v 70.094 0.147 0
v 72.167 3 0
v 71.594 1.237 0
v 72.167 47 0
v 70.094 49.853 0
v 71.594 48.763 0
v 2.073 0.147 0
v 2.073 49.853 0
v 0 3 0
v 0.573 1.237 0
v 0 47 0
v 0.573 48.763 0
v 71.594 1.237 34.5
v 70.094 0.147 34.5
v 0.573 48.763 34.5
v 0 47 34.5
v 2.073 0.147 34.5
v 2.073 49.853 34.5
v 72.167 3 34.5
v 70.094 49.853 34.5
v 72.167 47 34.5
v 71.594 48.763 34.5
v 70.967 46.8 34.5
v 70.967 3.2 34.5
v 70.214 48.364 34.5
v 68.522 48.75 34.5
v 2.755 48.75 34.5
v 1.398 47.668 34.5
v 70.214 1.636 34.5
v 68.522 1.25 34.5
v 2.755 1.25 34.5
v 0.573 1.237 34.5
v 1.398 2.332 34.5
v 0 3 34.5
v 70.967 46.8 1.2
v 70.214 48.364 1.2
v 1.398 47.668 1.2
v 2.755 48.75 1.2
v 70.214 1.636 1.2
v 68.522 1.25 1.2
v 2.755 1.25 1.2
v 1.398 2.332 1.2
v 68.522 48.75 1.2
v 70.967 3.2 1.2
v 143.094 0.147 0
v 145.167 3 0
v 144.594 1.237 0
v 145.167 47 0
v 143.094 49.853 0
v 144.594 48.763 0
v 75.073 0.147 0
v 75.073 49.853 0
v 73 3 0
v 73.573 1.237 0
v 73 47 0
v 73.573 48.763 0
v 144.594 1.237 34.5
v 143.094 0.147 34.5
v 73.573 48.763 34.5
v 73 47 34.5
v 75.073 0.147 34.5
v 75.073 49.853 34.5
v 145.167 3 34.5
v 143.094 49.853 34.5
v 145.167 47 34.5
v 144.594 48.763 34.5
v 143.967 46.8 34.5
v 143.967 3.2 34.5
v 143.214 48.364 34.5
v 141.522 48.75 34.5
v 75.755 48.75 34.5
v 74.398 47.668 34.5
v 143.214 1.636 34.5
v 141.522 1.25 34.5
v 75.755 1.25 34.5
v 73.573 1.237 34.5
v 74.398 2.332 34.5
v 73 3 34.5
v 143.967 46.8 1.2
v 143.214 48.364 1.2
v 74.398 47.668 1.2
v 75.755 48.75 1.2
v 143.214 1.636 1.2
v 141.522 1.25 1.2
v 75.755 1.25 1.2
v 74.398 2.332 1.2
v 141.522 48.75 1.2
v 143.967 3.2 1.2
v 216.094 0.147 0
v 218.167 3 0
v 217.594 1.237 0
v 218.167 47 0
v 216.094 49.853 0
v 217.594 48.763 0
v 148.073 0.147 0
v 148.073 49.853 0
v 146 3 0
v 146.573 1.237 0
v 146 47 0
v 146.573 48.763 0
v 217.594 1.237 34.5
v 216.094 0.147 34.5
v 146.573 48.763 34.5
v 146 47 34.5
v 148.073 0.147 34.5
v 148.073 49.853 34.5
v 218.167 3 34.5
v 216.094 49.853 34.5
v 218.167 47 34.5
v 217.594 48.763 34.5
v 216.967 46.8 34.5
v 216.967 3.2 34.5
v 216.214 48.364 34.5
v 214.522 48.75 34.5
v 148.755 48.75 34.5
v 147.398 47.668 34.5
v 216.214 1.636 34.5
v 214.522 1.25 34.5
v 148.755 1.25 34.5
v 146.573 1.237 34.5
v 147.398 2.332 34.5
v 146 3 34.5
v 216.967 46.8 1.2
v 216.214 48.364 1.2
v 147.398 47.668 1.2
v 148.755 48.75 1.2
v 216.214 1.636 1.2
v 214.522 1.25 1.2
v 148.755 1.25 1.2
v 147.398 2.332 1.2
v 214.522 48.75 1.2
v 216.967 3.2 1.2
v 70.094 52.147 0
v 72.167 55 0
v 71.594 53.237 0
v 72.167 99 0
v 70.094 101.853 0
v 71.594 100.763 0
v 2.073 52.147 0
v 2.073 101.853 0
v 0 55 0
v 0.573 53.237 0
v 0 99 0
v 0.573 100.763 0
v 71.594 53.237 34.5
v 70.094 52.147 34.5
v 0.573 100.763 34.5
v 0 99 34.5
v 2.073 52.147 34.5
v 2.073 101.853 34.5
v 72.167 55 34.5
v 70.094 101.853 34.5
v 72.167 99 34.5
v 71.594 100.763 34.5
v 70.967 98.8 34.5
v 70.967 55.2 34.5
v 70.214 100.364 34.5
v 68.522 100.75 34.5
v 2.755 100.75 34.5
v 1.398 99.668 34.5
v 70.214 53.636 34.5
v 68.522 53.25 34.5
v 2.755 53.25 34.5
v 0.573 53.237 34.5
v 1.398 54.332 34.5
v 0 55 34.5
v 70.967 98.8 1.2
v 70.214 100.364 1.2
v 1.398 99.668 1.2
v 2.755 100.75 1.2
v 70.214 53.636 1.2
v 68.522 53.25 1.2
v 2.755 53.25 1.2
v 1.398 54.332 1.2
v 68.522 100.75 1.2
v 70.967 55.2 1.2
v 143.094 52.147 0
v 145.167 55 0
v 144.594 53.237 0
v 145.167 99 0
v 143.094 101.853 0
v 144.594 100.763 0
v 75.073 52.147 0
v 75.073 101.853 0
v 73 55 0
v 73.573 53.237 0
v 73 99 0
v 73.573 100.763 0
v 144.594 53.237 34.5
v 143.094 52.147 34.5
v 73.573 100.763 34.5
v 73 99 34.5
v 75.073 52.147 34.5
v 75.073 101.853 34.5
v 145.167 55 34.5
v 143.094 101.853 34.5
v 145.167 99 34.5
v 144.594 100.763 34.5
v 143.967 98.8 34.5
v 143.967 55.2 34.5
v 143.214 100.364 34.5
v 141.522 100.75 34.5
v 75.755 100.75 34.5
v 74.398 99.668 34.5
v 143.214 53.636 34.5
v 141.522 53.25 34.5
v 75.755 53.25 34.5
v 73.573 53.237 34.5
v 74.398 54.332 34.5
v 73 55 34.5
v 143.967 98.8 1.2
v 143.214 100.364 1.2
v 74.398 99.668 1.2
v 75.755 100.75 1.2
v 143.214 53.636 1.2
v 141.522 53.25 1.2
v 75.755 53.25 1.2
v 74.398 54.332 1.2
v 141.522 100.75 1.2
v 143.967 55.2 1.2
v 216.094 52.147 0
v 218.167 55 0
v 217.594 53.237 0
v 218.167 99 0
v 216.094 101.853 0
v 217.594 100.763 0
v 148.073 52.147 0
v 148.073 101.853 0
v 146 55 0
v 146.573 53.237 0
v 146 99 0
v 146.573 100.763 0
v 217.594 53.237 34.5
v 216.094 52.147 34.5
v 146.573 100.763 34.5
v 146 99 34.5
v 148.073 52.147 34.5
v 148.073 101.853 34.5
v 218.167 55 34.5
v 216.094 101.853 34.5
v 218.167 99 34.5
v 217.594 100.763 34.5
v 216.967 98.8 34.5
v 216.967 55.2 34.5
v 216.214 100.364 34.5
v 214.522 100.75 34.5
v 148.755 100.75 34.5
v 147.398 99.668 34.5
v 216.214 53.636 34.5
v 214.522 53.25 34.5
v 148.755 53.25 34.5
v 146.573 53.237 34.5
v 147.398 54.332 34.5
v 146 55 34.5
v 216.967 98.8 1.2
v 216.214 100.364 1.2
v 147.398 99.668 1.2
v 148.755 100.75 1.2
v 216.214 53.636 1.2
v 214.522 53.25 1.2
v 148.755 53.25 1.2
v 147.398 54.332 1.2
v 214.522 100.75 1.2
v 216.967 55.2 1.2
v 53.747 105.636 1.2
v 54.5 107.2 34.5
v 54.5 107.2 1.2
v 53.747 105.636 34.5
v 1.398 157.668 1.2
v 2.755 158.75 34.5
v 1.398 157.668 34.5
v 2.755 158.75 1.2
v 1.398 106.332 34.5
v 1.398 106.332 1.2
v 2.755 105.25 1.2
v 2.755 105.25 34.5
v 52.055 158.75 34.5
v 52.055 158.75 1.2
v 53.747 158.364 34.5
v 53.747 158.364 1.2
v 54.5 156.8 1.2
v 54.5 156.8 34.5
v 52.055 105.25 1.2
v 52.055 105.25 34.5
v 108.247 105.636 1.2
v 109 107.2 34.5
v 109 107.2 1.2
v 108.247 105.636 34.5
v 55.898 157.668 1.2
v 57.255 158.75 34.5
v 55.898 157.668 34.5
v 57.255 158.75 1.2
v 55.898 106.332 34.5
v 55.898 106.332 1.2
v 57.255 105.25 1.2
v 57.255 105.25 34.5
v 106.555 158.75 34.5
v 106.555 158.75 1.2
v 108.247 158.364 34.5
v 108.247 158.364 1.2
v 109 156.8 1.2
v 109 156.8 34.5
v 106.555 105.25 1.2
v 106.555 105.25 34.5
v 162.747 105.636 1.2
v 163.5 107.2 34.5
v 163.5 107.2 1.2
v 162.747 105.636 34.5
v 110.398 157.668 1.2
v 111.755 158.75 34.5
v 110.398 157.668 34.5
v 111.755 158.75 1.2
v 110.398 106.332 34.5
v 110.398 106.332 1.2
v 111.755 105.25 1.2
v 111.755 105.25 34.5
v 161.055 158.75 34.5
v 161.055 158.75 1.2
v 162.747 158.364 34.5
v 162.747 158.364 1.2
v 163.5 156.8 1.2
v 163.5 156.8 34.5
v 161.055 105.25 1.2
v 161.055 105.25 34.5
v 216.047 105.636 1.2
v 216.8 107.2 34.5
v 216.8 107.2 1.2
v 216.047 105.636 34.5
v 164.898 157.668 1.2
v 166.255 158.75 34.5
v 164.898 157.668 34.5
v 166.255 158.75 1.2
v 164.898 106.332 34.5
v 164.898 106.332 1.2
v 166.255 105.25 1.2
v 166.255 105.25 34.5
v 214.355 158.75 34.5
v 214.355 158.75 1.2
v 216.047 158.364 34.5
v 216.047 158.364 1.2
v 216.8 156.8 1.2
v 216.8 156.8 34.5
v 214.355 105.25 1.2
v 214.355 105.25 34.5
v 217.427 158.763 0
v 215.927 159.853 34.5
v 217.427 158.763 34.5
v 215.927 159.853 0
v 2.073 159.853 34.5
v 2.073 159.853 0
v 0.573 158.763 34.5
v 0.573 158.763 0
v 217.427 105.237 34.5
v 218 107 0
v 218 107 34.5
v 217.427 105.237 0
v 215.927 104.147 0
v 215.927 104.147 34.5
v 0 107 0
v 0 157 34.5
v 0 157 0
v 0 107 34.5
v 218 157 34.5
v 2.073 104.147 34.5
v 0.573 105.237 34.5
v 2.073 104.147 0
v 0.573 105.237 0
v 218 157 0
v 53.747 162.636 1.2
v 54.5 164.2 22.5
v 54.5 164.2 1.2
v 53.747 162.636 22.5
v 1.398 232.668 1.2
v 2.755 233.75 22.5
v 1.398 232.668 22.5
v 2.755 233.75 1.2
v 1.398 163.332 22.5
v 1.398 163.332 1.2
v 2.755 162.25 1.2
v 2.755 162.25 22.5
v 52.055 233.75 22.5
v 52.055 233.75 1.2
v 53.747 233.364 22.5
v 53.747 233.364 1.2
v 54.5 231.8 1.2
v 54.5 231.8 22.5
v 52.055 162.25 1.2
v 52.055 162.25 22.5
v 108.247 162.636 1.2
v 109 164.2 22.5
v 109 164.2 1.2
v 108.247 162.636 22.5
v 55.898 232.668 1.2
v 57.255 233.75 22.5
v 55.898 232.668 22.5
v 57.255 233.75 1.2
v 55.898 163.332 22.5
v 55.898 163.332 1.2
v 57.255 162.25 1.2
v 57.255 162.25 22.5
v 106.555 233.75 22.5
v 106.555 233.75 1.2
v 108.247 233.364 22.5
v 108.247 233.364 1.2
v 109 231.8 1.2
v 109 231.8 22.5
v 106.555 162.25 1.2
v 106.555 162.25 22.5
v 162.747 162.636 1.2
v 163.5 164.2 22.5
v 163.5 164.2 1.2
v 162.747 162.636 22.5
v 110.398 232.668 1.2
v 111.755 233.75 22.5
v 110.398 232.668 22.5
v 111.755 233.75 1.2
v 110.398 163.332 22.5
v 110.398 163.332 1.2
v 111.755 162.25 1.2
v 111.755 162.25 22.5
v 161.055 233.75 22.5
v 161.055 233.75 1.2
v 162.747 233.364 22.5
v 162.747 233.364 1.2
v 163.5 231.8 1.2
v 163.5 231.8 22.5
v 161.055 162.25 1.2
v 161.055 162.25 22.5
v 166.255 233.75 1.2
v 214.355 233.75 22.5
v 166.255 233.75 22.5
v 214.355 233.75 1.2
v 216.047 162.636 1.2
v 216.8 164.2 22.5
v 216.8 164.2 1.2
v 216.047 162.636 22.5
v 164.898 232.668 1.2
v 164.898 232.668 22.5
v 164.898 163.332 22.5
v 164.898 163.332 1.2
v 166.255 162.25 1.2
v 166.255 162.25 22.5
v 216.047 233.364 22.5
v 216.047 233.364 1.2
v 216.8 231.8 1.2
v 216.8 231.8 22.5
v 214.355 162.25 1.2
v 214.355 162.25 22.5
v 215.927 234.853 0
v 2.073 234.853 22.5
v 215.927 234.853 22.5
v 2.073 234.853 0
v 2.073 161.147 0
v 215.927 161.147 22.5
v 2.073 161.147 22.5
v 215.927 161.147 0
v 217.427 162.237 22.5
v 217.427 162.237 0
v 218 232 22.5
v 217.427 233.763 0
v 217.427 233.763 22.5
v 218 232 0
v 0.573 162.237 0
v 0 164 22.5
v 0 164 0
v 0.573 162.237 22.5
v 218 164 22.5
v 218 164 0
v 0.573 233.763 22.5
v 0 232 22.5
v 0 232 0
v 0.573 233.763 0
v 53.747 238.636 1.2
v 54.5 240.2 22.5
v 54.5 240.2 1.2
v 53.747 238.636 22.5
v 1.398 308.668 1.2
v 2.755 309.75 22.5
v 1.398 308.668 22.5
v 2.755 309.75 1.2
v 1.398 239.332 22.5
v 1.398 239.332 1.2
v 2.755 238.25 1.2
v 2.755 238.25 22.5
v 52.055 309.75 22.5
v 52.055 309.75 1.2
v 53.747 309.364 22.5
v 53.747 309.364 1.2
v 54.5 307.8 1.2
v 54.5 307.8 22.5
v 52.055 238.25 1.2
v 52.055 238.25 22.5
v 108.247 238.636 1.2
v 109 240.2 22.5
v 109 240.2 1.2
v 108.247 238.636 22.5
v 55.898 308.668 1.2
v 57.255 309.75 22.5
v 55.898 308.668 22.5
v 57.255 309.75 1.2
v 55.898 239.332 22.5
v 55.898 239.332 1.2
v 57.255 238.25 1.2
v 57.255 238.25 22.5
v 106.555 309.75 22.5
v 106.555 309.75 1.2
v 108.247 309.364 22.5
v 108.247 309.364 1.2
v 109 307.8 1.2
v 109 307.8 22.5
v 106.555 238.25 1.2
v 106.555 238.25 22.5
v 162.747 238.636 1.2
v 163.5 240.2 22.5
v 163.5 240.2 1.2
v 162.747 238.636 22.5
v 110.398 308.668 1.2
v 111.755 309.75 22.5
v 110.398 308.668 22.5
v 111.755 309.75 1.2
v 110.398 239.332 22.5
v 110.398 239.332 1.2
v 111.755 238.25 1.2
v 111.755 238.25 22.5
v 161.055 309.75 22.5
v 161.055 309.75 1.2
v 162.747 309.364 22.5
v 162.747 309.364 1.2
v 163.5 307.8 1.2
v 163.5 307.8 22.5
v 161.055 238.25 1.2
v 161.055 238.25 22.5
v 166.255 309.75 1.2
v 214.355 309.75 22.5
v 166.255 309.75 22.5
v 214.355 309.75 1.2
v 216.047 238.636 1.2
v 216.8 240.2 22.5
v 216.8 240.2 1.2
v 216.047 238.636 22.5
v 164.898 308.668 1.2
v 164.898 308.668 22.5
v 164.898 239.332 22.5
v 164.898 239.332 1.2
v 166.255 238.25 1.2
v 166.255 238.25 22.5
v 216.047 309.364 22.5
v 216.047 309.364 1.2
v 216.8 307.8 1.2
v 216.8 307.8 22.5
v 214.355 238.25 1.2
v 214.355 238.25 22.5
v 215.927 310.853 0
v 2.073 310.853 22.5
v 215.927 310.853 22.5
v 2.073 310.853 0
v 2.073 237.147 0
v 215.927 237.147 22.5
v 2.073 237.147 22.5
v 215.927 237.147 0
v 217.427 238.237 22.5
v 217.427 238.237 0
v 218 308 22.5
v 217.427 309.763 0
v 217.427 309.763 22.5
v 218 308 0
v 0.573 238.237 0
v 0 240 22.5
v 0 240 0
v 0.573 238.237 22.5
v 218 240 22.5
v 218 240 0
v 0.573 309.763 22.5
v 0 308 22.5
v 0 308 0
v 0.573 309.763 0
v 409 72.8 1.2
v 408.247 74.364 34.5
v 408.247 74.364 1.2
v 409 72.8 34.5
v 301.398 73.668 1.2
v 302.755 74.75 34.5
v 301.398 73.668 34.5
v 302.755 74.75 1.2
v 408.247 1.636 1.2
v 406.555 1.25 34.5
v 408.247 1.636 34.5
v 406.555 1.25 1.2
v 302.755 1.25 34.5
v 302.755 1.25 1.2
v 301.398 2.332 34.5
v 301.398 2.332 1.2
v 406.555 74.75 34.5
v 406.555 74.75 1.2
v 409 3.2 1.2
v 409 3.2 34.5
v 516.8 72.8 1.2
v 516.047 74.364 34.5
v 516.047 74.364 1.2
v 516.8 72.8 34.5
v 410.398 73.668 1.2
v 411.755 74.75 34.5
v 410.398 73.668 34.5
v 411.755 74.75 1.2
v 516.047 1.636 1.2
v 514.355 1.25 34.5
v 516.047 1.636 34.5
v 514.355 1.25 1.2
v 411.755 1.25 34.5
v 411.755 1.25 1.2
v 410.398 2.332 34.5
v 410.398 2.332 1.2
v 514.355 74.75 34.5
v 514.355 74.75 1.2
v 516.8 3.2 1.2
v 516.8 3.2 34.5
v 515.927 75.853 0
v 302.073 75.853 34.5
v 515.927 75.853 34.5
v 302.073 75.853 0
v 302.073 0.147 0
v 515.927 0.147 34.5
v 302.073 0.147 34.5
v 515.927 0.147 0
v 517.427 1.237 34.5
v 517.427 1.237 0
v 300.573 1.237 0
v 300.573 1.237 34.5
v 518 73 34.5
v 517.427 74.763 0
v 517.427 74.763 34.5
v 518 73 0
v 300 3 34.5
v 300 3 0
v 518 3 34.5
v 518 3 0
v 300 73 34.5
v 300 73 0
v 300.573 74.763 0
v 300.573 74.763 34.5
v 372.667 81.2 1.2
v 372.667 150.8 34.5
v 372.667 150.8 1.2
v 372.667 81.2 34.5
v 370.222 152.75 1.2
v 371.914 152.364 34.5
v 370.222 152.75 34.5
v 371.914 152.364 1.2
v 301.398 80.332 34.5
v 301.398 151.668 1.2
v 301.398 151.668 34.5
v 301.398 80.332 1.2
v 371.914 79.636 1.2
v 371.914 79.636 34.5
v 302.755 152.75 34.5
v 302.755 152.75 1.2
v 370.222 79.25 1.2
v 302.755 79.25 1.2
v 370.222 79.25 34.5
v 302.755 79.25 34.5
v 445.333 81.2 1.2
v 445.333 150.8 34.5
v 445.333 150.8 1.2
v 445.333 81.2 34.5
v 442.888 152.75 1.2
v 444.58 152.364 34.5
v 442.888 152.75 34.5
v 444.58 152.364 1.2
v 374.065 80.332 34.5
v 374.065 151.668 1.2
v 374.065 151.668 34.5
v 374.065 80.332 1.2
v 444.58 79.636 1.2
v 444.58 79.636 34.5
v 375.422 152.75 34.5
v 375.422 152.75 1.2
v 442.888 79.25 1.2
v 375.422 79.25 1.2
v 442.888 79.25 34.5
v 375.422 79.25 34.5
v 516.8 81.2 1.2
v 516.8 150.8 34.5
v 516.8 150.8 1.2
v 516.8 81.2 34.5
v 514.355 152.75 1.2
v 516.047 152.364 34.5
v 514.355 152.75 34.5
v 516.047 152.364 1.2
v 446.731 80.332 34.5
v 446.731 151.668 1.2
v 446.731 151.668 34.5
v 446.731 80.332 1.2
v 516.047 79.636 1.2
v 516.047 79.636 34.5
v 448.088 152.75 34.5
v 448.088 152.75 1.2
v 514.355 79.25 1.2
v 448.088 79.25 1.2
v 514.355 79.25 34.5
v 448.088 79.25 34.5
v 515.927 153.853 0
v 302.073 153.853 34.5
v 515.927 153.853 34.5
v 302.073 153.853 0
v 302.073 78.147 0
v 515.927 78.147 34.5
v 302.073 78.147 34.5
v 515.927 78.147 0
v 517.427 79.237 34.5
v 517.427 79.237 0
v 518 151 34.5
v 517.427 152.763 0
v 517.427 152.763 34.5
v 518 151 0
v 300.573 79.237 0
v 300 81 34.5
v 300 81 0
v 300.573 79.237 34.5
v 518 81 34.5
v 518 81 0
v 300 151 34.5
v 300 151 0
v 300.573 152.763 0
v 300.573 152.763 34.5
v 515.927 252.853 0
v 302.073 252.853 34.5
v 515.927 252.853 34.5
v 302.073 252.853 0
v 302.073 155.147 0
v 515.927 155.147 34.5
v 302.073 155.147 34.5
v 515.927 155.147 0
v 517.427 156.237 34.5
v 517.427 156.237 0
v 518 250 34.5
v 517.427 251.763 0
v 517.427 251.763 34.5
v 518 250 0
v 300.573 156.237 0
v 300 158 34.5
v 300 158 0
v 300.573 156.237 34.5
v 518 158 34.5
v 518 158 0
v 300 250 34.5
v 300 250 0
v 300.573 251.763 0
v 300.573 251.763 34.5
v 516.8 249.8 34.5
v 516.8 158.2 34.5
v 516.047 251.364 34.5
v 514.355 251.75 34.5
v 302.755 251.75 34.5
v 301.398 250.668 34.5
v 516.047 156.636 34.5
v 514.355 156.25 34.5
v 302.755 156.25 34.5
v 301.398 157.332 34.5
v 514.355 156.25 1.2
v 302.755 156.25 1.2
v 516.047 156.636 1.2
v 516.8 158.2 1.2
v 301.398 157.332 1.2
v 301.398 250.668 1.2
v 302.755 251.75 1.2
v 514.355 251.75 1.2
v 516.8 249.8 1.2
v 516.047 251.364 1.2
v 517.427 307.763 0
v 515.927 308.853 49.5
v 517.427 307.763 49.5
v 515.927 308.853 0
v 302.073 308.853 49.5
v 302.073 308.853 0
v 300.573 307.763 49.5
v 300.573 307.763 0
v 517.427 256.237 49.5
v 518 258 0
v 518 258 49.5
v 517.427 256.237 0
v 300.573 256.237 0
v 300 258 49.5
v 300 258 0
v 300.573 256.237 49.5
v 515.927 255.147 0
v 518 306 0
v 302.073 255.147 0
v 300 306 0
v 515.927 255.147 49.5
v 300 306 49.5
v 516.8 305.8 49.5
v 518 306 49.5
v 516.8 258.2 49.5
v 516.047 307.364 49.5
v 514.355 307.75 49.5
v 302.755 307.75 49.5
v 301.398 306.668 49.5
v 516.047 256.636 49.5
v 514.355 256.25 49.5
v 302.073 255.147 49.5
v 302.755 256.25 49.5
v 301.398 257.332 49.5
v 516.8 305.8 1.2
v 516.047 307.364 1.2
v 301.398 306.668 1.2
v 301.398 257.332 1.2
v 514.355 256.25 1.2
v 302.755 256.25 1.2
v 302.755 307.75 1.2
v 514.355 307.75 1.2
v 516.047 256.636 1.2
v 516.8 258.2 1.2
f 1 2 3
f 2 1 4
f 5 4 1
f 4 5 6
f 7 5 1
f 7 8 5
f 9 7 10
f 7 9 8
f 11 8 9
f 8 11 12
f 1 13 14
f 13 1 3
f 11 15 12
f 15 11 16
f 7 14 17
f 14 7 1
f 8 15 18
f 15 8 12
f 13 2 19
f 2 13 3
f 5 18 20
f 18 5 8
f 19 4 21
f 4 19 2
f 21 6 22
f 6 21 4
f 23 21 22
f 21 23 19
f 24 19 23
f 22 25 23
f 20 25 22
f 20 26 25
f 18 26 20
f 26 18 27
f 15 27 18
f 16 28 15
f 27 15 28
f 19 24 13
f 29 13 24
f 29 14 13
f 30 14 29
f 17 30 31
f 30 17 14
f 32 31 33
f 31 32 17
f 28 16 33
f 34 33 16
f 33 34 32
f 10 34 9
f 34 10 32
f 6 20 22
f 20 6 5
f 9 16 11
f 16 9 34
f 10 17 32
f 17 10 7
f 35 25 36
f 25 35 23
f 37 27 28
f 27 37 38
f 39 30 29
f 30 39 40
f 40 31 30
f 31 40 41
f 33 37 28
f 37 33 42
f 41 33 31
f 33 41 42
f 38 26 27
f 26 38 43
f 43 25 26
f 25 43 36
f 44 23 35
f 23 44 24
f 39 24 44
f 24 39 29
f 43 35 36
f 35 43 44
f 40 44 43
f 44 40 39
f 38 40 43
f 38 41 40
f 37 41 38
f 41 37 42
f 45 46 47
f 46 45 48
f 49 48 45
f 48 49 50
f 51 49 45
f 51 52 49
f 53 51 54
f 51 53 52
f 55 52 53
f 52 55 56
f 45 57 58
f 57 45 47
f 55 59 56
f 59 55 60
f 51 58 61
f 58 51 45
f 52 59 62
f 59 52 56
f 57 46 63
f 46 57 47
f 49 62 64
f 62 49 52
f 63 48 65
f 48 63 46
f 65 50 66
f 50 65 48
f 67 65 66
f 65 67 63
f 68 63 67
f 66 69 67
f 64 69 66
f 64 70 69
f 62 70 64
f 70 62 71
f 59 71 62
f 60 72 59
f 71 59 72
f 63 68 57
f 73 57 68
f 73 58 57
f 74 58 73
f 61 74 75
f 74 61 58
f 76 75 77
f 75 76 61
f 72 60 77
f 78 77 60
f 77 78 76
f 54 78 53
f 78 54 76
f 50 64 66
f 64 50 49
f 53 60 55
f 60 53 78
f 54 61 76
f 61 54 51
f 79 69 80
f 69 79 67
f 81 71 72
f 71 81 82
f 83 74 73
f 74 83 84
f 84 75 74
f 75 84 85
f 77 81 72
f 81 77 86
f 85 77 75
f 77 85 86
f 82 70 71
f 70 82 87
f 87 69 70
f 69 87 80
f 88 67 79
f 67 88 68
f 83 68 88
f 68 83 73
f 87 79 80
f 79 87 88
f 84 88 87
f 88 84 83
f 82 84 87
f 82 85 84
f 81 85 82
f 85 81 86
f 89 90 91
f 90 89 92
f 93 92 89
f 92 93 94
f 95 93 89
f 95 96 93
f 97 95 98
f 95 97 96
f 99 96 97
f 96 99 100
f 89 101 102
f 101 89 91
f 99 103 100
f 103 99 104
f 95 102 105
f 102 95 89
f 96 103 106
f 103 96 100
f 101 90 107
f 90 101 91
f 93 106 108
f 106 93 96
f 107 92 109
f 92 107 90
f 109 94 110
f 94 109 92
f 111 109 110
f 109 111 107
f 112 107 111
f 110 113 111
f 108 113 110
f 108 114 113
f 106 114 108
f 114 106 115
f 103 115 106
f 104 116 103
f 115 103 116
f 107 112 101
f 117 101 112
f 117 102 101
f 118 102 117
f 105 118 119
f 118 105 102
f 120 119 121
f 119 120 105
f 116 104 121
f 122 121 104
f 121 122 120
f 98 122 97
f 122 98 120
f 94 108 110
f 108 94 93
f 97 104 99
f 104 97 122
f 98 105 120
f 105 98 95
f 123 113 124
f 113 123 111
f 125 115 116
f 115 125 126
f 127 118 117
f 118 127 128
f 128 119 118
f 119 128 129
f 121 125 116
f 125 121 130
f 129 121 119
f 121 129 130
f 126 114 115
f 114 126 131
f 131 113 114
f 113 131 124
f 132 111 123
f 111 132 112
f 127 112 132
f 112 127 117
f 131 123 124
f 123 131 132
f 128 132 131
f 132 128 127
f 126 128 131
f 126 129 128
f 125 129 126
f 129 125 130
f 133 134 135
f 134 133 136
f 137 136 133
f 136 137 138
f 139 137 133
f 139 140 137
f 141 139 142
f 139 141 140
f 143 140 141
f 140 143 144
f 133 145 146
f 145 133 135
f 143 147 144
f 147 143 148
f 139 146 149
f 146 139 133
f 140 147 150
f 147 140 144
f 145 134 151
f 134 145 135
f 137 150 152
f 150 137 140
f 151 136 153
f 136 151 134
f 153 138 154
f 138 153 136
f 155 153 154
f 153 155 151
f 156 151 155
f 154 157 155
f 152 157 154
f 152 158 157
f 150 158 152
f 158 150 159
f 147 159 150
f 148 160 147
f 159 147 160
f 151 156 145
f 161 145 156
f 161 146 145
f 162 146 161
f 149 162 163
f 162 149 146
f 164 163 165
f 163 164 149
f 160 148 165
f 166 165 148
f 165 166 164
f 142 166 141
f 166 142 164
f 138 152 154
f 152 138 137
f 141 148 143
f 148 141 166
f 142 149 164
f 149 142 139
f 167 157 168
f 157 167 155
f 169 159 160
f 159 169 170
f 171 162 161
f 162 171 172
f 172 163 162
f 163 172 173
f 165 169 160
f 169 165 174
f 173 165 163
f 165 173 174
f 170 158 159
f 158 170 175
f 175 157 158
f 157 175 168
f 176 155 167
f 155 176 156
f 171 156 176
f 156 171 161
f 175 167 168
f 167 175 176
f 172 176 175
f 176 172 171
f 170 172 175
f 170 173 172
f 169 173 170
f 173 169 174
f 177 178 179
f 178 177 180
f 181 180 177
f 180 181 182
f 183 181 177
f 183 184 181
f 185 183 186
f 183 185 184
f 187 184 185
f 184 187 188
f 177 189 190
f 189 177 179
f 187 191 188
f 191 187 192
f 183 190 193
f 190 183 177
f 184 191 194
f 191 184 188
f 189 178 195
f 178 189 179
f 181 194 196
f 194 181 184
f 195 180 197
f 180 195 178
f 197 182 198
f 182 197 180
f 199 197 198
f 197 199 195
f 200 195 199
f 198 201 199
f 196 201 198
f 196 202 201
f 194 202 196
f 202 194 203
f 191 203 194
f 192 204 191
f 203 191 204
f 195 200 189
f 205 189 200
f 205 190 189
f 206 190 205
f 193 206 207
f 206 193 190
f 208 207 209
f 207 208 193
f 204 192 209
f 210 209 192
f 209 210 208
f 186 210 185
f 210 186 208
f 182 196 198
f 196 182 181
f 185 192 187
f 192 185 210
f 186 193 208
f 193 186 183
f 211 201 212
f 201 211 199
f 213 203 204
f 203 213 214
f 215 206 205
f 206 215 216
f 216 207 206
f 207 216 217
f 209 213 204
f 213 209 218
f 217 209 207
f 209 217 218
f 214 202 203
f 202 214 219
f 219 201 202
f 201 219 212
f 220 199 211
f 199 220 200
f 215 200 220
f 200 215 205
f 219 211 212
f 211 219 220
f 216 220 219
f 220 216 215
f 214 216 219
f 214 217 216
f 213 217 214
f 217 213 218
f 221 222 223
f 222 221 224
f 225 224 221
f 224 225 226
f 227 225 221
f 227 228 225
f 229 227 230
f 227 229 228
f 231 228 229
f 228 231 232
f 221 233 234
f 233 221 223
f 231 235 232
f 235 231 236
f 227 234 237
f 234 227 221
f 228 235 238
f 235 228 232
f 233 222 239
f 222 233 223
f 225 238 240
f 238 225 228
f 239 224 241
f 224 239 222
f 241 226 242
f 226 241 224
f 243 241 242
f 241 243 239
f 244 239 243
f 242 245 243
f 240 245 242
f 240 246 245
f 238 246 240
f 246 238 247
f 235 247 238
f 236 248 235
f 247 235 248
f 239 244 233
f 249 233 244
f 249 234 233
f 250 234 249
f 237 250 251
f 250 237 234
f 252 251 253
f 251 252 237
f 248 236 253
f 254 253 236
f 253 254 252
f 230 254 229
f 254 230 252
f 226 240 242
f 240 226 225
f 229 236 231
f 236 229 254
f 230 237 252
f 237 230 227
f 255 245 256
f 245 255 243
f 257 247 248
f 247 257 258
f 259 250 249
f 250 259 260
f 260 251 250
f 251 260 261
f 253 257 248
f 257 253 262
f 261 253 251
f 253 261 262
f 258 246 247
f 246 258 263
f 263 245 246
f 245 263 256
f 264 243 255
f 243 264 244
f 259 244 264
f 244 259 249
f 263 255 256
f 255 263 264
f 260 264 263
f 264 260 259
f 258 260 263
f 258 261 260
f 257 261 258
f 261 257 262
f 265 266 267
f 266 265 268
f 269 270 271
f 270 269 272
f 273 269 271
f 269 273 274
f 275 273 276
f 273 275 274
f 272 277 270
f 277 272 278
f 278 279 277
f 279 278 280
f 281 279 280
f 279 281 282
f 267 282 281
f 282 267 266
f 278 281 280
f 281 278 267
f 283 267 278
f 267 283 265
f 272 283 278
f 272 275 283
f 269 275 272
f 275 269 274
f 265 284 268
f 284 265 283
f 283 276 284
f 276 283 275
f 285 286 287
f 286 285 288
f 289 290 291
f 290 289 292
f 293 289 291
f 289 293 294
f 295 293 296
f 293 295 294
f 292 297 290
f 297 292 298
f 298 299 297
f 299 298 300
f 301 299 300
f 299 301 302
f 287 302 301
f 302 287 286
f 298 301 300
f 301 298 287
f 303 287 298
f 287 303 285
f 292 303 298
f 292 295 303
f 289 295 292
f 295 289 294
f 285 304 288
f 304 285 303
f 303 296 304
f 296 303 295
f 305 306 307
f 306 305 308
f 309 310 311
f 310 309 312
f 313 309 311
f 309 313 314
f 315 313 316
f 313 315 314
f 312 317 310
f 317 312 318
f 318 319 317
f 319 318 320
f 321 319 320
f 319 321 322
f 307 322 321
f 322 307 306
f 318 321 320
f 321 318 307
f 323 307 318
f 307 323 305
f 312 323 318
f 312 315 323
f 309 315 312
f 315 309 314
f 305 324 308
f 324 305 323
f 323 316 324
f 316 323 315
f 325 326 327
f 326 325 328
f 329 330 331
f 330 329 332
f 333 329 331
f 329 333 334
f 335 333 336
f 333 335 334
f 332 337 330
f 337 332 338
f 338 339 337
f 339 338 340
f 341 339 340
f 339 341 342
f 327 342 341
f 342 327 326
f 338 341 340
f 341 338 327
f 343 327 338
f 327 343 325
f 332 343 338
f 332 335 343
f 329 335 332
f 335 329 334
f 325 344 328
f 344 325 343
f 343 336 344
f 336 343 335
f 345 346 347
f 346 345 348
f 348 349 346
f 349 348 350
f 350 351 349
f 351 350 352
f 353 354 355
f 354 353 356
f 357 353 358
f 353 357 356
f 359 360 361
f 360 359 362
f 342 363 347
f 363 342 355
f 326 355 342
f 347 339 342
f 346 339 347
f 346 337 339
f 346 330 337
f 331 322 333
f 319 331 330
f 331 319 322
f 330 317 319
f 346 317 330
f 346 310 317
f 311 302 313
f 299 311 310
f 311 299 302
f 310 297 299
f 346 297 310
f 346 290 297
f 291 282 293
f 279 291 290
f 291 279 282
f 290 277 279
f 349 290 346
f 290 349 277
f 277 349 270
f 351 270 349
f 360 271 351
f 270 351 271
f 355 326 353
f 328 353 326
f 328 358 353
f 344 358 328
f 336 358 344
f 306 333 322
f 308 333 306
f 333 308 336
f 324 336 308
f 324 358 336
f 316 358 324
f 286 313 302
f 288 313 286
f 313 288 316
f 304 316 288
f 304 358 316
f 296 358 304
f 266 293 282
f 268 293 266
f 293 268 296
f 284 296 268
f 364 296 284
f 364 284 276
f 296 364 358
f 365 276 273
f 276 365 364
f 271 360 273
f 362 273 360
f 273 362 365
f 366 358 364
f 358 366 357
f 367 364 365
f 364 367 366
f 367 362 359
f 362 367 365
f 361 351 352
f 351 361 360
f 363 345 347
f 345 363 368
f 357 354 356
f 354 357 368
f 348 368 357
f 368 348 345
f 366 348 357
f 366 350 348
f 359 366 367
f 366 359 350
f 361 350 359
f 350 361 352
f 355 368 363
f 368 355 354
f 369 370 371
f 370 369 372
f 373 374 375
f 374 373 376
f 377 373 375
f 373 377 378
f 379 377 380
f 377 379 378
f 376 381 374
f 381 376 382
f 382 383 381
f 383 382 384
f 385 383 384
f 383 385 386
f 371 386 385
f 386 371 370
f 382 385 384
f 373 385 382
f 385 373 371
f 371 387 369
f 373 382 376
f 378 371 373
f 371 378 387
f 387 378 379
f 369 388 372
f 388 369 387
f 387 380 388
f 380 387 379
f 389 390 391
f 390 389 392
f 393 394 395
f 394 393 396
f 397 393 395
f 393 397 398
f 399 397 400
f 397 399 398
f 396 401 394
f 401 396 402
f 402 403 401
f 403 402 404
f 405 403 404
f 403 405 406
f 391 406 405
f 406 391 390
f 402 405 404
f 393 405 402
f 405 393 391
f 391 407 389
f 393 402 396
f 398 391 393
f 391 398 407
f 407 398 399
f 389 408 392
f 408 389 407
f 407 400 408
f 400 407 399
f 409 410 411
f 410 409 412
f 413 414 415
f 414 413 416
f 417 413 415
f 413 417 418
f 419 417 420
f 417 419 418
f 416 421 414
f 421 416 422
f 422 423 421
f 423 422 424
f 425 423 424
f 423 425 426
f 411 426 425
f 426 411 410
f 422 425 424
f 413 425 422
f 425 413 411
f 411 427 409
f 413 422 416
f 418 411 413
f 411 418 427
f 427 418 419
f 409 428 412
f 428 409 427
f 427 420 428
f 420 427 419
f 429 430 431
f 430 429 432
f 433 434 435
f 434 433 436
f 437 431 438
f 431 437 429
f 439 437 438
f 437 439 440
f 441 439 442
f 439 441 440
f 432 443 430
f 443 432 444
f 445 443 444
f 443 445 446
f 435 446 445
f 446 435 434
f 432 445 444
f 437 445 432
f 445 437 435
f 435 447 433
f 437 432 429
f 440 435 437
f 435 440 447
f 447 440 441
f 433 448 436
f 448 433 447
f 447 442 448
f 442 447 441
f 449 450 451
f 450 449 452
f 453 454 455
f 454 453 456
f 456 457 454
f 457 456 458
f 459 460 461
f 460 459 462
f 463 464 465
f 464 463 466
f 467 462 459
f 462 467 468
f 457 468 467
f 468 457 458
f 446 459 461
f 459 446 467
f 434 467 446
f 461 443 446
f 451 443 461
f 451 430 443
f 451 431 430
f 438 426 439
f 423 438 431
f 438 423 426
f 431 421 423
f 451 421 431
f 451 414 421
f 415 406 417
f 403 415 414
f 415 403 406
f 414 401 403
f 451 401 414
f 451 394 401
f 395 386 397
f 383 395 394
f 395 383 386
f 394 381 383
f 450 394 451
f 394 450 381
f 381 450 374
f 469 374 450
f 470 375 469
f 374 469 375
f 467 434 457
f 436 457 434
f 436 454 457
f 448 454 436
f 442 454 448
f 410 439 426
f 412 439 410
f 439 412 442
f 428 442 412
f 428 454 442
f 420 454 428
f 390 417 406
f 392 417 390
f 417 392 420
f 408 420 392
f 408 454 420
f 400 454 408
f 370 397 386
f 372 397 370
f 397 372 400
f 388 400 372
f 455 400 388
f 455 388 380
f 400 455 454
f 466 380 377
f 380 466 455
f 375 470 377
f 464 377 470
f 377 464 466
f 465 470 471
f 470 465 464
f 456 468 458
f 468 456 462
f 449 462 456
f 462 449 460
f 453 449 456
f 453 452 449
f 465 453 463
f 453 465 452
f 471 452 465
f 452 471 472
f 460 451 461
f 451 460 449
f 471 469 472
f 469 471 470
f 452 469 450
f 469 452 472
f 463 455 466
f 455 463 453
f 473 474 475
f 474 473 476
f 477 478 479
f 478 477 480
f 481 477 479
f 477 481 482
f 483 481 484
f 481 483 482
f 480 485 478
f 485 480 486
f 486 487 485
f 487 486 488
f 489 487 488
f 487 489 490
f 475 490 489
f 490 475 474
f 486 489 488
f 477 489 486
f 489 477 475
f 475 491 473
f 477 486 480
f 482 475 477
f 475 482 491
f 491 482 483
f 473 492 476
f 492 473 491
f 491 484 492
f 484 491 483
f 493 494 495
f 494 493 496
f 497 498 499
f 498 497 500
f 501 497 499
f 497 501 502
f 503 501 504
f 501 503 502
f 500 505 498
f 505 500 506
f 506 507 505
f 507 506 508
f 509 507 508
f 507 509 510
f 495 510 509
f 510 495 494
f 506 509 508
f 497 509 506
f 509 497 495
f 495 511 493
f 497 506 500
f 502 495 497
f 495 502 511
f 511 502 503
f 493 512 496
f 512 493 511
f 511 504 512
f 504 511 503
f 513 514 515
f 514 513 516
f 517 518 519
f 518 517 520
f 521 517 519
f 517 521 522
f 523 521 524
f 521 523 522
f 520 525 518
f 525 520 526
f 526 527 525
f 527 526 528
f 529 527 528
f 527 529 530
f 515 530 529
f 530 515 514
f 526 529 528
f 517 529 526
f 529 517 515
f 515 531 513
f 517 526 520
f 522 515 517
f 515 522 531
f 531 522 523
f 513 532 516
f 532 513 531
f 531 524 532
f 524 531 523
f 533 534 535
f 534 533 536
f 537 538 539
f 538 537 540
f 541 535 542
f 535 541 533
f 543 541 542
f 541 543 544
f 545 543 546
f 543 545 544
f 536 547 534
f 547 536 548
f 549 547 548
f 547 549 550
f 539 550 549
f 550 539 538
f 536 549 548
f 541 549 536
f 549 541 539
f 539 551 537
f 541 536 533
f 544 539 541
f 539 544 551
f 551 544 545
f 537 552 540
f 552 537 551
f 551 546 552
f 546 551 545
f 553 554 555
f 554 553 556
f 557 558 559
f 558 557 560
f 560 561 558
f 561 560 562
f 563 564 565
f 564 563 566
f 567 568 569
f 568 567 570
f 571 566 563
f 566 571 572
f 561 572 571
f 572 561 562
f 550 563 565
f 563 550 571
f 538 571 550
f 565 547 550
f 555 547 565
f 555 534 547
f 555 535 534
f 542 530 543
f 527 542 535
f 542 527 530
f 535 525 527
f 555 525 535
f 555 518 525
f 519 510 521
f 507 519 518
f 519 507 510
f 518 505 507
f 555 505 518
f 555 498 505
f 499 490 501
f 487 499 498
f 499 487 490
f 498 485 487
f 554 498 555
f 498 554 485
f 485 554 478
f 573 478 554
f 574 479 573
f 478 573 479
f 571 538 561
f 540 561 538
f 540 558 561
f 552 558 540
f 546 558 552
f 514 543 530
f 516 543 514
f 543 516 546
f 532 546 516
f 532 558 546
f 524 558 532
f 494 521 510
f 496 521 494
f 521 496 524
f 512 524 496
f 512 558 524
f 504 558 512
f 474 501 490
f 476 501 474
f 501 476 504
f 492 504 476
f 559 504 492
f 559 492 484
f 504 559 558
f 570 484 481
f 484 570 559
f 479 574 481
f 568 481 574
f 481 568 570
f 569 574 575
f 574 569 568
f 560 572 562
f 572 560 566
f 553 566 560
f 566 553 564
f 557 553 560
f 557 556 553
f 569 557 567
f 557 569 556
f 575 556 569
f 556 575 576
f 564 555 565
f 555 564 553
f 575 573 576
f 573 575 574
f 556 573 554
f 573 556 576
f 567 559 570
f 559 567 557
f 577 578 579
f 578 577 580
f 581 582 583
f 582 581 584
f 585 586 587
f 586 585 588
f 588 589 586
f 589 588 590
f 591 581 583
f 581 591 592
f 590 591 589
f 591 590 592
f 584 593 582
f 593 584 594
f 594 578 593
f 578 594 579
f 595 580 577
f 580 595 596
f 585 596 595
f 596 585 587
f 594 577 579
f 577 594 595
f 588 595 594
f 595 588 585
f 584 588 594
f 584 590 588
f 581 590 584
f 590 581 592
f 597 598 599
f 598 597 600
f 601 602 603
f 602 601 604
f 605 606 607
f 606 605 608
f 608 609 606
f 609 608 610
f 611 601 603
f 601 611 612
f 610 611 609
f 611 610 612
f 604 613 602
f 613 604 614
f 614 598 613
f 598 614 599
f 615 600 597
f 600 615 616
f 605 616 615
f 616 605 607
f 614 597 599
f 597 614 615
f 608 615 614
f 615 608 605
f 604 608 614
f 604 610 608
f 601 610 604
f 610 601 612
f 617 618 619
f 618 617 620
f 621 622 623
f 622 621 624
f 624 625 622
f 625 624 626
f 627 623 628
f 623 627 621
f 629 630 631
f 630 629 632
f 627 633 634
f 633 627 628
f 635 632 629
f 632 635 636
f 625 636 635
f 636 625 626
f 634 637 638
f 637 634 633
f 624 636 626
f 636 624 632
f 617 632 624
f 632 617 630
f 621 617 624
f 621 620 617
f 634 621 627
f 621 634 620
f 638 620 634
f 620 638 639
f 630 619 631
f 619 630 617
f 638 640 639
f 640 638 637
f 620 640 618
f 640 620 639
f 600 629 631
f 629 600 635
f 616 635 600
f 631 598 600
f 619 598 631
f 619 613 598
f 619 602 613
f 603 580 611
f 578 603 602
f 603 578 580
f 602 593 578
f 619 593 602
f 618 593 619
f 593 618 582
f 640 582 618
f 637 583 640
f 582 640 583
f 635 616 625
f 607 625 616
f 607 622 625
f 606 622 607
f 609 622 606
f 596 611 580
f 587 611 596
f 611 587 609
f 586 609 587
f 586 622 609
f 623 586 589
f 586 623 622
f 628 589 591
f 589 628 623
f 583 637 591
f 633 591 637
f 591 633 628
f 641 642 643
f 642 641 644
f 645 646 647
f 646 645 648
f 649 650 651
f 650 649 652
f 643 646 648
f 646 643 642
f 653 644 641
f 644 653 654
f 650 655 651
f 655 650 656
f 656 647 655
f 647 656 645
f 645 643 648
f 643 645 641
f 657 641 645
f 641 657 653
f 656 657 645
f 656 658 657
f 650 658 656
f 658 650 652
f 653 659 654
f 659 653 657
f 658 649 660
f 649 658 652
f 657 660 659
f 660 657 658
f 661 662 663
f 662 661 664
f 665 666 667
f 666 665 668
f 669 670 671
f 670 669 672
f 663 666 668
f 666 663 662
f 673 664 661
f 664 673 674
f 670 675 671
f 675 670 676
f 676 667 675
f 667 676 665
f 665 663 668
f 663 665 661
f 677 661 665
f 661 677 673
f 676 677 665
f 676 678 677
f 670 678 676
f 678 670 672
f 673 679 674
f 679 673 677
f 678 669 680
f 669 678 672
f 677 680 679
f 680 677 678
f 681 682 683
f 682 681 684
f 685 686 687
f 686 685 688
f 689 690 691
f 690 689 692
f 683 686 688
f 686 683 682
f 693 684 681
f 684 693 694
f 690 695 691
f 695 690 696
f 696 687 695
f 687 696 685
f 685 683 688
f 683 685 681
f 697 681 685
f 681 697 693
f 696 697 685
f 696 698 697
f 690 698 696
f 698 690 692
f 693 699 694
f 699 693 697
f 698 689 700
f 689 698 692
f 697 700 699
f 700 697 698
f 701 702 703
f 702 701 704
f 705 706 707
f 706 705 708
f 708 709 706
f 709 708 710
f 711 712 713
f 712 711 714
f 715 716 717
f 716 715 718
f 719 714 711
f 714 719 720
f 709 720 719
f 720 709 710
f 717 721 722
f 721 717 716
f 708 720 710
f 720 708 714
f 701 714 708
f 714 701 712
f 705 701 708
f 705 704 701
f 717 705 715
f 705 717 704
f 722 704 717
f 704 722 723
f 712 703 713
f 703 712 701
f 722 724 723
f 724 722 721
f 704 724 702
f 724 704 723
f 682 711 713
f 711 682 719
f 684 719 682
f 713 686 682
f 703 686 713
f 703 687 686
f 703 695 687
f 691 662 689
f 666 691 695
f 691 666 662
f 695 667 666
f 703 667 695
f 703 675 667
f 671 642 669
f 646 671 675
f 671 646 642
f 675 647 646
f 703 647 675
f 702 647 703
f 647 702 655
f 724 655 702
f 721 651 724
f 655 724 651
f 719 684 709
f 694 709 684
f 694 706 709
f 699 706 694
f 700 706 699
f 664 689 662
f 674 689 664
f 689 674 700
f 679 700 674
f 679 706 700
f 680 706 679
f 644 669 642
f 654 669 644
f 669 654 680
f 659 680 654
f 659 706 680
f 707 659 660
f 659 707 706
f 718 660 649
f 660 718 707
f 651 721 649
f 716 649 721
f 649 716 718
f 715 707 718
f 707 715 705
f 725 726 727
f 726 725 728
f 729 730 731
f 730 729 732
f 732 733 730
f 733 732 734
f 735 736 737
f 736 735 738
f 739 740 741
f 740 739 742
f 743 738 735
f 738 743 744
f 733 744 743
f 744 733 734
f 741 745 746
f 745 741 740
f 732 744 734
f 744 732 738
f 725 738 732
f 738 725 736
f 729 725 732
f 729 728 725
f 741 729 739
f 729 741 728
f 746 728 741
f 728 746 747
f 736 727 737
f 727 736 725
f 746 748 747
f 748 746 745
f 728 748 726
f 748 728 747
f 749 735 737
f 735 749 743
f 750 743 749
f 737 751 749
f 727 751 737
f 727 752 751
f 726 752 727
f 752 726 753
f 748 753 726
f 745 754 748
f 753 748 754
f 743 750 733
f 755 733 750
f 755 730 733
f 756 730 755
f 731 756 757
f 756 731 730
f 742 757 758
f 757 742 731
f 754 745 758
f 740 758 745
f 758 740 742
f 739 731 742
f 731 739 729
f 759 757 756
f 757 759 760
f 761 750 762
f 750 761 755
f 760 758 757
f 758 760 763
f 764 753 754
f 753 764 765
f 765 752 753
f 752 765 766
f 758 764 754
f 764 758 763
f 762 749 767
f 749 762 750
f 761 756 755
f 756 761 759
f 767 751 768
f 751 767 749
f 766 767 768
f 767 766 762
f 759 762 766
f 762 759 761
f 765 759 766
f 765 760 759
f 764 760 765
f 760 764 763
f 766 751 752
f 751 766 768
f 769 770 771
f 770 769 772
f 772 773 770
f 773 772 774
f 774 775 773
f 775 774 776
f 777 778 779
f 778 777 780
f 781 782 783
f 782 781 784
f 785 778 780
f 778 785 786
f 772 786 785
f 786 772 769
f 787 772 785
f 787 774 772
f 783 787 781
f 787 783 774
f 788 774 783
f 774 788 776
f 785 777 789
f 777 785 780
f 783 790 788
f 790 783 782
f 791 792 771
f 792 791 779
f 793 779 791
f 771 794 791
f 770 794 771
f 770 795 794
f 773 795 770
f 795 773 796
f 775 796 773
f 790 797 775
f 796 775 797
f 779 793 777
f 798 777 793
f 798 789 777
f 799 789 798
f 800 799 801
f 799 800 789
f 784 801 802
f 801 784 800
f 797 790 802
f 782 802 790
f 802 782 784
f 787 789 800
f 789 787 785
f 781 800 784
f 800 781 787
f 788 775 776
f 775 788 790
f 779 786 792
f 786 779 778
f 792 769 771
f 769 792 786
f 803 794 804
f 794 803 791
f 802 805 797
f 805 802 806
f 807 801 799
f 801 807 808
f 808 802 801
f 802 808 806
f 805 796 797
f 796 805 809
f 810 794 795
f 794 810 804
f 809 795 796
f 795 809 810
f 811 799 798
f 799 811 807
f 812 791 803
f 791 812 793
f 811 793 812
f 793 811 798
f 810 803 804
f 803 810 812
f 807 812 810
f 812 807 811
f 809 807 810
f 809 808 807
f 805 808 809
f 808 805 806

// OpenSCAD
// Carson City
include <BoardGameSystem.scad>;

box_length = 307; // 4 lanes and 2 mm gutter
lane_width = (box_length - 2) / 4;
box_width = 218;
box_height = 69; // After game boards and rules
empty_box_height = 100;

main_board_height = 15;
main_board_width = 218;
main_board_length = 250; 
// Gap box_length - main_board_length
// 57 x 218 x 15

// Pad
// 210 x 148 x 12

layer1_height = 34.5;
layer1_low_height = 34.5-12;
layer1_high_height = 34.5+15;
layer2_height = 34.5;
layer3_height = 0;
hex_bottom = 6;
no_hex = 0;

// Bottom layer 304mm
// Player boxes
color("blue")
tokenBox(size=[box_width/3-0.5, 50, layer1_height], hexBottom=no_hex, corner=3);
color("red")
translate([73, 0 ,0])
tokenBox(size=[box_width/3-0.5, 50, layer1_height], hexBottom=no_hex, corner=3);
color("blue")
translate([146, 0 ,0])
tokenBox(size=[box_width/3-0.5, 50, layer1_height], hexBottom=no_hex, corner=3);

color("red")
translate([0, 52 ,0])
tokenBox(size=[box_width/3-0.5, 50, layer1_height], hexBottom=no_hex, corner=3);
color("blue")
translate([73, 52 ,0])
tokenBox(size=[box_width/3-0.5, 50, layer1_height], hexBottom=no_hex, corner=3);
color("red")
translate([146, 52 ,0])
tokenBox(size=[box_width/3-0.5, 50, layer1_height], hexBottom=no_hex, corner=3);

// Money
translate([0, 104 ,0])
tokenBox(size=[box_width, 56, layer1_height], hexBottom=no_hex, corner=3, containersX=4, containersY=1);

// Setup tiles river, mountains, character, start tile, Bandits
translate([0, 161 ,0])
tokenBox(size=[box_width, 74, layer1_low_height], hexBottom=no_hex, corner=3, containersX=4, containersY=1);

// Guns, Guns, Horses, Rails
translate([0, 237 ,0])
tokenBox(size=[box_width, 74, layer1_low_height], hexBottom=no_hex, corner=3, containersX=4, containersY=1);


// Top layer 304mm
// Horses & Houses
translate([300, 0,0])
tokenBox(size=[box_width, 76, layer1_height], hexBottom=no_hex, corner=3, containersX=2, containersY=1);

// Characters
translate([300, 78 ,0])
tokenBox(size=[box_width, 76, layer1_height], hexBottom=no_hex, corner=3, containersX=3, containersY=1);

// Bag
translate([300, 155 ,0])
tokenBox(size=[box_width, 98, layer1_height], hexBottom=no_hex, corner=3, containersX=1, containersY=1);

// Tiles
translate([300, 255 ,0])
tokenBox(size=[box_width, 54, layer1_high_height], hexBottom=no_hex, corner=3, containersX=1, containersY=1);
